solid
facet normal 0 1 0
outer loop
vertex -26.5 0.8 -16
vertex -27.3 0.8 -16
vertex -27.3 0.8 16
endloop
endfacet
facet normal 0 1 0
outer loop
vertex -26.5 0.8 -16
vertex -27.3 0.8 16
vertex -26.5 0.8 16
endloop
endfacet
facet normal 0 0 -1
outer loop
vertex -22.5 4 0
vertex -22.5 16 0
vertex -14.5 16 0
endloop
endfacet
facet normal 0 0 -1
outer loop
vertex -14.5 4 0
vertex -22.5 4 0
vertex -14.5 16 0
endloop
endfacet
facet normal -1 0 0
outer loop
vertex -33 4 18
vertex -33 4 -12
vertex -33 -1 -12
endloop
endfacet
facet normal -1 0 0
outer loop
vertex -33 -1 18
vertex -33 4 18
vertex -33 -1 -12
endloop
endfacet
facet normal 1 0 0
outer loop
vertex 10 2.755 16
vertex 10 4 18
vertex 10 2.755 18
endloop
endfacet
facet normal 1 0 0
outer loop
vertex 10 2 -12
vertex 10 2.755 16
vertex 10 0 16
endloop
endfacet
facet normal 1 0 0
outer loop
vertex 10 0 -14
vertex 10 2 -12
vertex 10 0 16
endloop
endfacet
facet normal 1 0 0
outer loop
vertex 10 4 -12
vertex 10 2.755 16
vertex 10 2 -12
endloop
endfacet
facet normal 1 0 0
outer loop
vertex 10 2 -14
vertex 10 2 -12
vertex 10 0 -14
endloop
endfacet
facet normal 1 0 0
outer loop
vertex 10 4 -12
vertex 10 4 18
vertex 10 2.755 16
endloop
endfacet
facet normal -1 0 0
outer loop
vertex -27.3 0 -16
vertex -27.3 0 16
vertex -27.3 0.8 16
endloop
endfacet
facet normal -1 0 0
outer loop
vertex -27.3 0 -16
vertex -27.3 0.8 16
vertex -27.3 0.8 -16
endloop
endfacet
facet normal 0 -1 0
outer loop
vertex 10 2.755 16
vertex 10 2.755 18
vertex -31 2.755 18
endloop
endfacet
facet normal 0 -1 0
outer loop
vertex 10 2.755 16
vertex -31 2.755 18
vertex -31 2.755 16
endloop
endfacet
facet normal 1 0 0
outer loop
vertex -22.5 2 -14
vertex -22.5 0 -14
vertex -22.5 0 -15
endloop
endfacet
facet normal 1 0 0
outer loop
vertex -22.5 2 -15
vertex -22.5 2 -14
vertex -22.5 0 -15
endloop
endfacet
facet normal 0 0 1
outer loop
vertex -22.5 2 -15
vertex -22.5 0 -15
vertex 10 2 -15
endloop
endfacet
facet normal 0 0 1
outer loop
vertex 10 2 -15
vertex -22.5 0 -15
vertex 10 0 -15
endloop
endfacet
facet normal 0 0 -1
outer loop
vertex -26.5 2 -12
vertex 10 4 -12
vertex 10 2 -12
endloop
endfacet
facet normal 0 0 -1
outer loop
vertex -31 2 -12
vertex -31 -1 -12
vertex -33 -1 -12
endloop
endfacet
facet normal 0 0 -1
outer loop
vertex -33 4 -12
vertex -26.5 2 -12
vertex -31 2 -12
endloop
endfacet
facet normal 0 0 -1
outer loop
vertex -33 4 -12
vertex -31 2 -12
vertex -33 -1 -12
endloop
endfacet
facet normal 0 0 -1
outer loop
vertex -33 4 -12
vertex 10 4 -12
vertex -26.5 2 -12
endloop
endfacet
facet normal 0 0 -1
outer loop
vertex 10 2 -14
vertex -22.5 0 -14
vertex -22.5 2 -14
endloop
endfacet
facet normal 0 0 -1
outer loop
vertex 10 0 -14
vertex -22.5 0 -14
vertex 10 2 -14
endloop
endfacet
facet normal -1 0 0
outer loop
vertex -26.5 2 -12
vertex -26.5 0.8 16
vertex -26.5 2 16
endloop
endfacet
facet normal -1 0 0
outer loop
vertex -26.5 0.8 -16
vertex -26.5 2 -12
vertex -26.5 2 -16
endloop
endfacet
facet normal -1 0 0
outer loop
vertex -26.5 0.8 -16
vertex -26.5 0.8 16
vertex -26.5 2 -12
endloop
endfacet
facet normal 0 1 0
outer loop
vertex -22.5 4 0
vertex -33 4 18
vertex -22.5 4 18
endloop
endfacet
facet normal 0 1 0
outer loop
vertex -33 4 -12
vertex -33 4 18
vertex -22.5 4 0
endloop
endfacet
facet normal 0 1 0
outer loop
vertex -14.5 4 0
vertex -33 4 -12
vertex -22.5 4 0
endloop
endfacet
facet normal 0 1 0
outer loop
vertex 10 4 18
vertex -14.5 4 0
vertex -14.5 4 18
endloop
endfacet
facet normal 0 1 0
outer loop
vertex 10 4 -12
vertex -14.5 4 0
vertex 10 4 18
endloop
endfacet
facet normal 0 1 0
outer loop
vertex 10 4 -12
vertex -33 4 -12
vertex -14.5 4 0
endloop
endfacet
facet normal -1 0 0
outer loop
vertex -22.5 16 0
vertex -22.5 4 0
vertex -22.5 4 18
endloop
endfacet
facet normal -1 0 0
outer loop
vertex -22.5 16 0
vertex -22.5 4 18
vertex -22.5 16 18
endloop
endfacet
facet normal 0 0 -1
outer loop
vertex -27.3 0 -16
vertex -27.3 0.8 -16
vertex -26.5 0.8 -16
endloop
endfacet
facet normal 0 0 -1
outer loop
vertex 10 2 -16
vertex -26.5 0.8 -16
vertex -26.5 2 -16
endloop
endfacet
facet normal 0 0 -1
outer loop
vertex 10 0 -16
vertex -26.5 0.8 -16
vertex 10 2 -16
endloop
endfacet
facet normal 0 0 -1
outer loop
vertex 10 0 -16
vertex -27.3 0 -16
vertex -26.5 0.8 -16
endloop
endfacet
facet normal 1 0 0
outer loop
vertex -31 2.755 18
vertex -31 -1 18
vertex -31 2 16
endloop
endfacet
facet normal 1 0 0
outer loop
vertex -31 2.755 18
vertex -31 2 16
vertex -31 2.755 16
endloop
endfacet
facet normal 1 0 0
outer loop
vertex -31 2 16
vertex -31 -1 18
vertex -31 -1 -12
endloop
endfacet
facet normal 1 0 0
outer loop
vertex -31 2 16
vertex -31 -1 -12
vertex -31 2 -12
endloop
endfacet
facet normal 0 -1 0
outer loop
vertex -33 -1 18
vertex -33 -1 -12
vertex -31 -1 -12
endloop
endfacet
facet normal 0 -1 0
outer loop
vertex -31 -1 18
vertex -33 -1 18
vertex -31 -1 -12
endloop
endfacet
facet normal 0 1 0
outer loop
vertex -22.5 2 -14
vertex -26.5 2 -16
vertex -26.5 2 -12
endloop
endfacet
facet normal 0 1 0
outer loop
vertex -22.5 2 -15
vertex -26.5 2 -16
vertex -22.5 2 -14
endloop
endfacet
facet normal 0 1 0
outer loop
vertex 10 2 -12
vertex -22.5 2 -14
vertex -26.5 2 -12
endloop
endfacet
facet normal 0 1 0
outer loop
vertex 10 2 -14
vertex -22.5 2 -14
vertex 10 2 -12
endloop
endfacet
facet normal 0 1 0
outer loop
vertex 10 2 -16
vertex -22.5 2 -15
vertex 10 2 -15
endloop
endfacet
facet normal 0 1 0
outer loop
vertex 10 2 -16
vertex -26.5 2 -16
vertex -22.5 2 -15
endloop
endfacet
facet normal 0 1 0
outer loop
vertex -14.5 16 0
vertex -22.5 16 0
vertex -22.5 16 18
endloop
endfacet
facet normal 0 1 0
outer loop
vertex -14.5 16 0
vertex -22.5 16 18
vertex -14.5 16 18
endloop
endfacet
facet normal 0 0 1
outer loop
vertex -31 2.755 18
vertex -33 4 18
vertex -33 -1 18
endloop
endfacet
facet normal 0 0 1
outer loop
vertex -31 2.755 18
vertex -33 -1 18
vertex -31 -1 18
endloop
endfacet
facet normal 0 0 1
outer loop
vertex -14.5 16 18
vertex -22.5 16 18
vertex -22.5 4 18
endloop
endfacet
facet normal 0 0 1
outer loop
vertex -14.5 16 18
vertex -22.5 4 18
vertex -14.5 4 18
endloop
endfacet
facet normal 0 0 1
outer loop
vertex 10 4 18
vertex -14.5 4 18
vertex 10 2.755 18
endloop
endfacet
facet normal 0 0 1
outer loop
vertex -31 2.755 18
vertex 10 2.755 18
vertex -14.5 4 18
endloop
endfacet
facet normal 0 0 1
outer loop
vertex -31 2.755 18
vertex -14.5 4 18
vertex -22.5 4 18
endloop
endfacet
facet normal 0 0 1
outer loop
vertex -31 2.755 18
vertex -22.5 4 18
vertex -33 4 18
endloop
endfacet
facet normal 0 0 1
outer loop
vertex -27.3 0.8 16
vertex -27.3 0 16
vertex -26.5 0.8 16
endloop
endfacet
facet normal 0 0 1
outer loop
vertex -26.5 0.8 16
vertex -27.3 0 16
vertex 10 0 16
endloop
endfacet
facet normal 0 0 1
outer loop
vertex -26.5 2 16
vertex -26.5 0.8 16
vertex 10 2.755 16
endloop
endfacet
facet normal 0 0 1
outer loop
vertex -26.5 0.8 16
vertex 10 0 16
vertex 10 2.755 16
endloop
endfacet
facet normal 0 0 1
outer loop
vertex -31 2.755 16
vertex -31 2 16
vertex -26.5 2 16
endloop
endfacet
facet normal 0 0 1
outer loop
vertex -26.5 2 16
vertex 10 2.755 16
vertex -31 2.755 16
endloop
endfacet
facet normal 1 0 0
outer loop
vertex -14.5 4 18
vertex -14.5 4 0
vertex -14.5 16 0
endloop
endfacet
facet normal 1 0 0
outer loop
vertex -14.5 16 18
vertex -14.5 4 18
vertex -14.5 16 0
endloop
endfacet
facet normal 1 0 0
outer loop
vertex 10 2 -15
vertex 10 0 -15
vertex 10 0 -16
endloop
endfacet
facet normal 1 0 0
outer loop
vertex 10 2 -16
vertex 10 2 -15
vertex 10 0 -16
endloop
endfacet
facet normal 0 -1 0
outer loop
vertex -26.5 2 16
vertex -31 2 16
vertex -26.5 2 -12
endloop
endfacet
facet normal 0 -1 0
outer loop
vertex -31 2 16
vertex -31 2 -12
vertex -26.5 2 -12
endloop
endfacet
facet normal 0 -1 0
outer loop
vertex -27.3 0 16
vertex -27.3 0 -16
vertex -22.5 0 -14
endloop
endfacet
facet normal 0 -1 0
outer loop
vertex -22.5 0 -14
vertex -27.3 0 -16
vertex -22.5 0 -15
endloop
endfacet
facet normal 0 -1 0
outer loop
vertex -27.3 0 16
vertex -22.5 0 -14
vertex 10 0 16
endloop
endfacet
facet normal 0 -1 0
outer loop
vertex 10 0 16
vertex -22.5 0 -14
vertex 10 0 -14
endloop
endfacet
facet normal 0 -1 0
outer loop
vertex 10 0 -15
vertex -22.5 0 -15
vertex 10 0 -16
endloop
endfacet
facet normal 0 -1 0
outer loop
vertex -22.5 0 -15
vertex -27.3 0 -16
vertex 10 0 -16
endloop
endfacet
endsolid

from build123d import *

# Parameters (mm, degrees)
SKETCH_1_W                      = 53
SKETCH_1_H                      = 32
EXTRUDE_1_DEPTH                 = 2
SKETCH_1_5_W                    = 0.8
SKETCH_1_5_H                    = 32
EXTRUDE_3_DEPTH                 = 0.8
SKETCH_1_6_W                    = 0.8
SKETCH_1_6_H                    = 32
EXTRUDE_4_DEPTH                 = 0.8
SKETCH_3_W                      = 54.6
SKETCH_3_H                      = 1
EXTRUDE_5_DEPTH                 = 0.8
SKETCH_4_W                      = 45
SKETCH_4_H                      = 1
CUT_EXTRUDE_1_DEPTH             = 33.222507662
SKETCH_4_2_W                    = 45
SKETCH_4_2_H                    = 1
EXTRUDE_6_DEPTH                 = 2
SKETCH_5_W                      = 45
SKETCH_5_H                      = 1
CUT_EXTRUDE_2_DEPTH             = 2
SKETCH_6_W                      = 0.8
SKETCH_6_H                      = 1
CUT_EXTRUDE_3_DEPTH             = 10
EXTRUDE_7_DEPTH                 = 18
EXTRUDE_7_DEPTH_BACK            = 12
EXTRUDE_8_DEPTH                 = 18
EXTRUDE_8_DEPTH_BACK            = 12
SKETCH_8_W                      = 49
SKETCH_8_H                      = 2
CUT_EXTRUDE_4_REACH             = 39.802
SKETCH_12_W                     = 2
SKETCH_12_H                     = 0.755050506
CUT_EXTRUDE_4_DIRECTION_2_REACH = 39.802
CUT_EXTRUDE_5_REACH             = 48.787
SKETCH_9_W                      = 48.171487548
SKETCH_9_H                      = 25.213726265
CUT_EXTRUDE_6_REACH             = 48.787
SKETCH_13_W                     = 1
SKETCH_13_H                     = 0.8
SKETCH_14_W                     = 8
SKETCH_14_H                     = 12
EXTRUDE_9_DEPTH                 = 18


with BuildPart() as part:
    # 草图1 → 凸台-拉伸1 (new body)
    with BuildSketch(Plane(origin=(0, 0, 0), x_dir=(1, 0, 0), z_dir=(0, 1, 0))):
        Rectangle(SKETCH_1_W, SKETCH_1_H)
    extrude(amount=EXTRUDE_1_DEPTH)

    # 草图1<5> → 凸台-拉伸3 (add)
    with BuildSketch(Plane(origin=(0, 0, 0), x_dir=(1, 0, 0), z_dir=(0, 1, 0))):
        with Locations((-26.9, 0)):
            Rectangle(SKETCH_1_5_W, SKETCH_1_5_H)
    extrude(amount=EXTRUDE_3_DEPTH)

    # 草图1<6> → 凸台-拉伸4 (add)
    with BuildSketch(Plane(origin=(0, 0, 0), x_dir=(1, 0, 0), z_dir=(0, 1, 0))):
        with Locations((26.9, 0)):
            Rectangle(SKETCH_1_6_W, SKETCH_1_6_H)
    extrude(amount=EXTRUDE_4_DEPTH)

    # 草图3 → 凸台-拉伸5 (add)
    with BuildSketch(Plane(origin=(0, 0, 0), x_dir=(1, 0, 0), z_dir=(0, 1, 0))):
        with Locations((0, -16.5)):
            Rectangle(SKETCH_3_W, SKETCH_3_H)
    extrude(amount=EXTRUDE_5_DEPTH)

    # 草图4 → 切除-拉伸1 (cut, through all)
    with BuildSketch(Plane(origin=(0, 0, 0), x_dir=(1, 0, 0), z_dir=(0, 1, 0))):
        with Locations((0, -14.5)):
            Rectangle(SKETCH_4_W, SKETCH_4_H)
    extrude(amount=CUT_EXTRUDE_1_DEPTH, mode=Mode.SUBTRACT)

    # 草图4<2> → 凸台-拉伸6 (add)
    with BuildSketch(Plane(origin=(0, 0, 0), x_dir=(1, 0, 0), z_dir=(0, 1, 0))):
        with Locations((0, -14.5)):
            Rectangle(SKETCH_4_2_W, SKETCH_4_2_H)
    extrude(amount=EXTRUDE_6_DEPTH)

    # 草图5 → 切除-拉伸2 (cut)
    with BuildSketch(Plane(origin=(0, 0, 0), x_dir=(1, 0, 0), z_dir=(0, 1, 0))):
        with Locations((0, 14.5)):
            Rectangle(SKETCH_5_W, SKETCH_5_H)
    extrude(amount=CUT_EXTRUDE_2_DEPTH, mode=Mode.SUBTRACT)

    # 草图6 → 切除-拉伸3 (cut)
    with BuildSketch(Plane(origin=(0, 0, 0), x_dir=(1, 0, 0), z_dir=(0, 1, 0))):
        with Locations((-26.9, -16.5)):
            Rectangle(SKETCH_6_W, SKETCH_6_H)
        with Locations((26.9, -16.5)):
            Rectangle(SKETCH_6_W, SKETCH_6_H)
    extrude(amount=CUT_EXTRUDE_3_DEPTH, mode=Mode.SUBTRACT)

    # 草图7 → 凸台-拉伸7 (add, two sides: drawn at the far end of the back side and taken through both)
    with BuildSketch(Plane.XY.offset(-EXTRUDE_7_DEPTH_BACK)):
        Polygon((-24.5, 2), (-24.5, 4), (-33, 4), (-33, -1), (-31, -1), (-31, 2), align=None)
        Polygon((24.5, 2), (24.5, 4), (33, 4), (33, -1), (31, -1), (31, 2), align=None)
    extrude(amount=EXTRUDE_7_DEPTH + EXTRUDE_7_DEPTH_BACK)

    # 草图8 → 凸台-拉伸8 (add, two sides: drawn at the far end of the back side and taken through both)
    with BuildSketch(Plane.XY.offset(-EXTRUDE_8_DEPTH_BACK)):
        with Locations((0, 3)):
            Rectangle(SKETCH_8_W, SKETCH_8_H)
    extrude(amount=EXTRUDE_8_DEPTH + EXTRUDE_8_DEPTH_BACK)

    # 切除-拉伸4: up to this face of the body (flat: up to its plane)
    cut_extrude_4_end = Plane(part.part.faces().sort_by_distance((-31, 0.5, 3))[0])
    # 草图12 → 切除-拉伸4 (cut, up to the picked face)
    with BuildSketch(Plane(origin=(0, 0, 0), x_dir=(0, 0, -1), z_dir=(1, 0, 0)), mode=Mode.PRIVATE) as cut_extrude_4_sk1:
        with Locations((-17, 2.377525253)):
            Rectangle(SKETCH_12_W, SKETCH_12_H)
    cut_extrude_4_tool1 = split(extrude(cut_extrude_4_sk1.sketch, amount=-CUT_EXTRUDE_4_REACH, mode=Mode.PRIVATE), bisect_by=cut_extrude_4_end, keep=Keep.BOTH, mode=Mode.PRIVATE)
    add(cut_extrude_4_tool1.solids().sort_by(Axis((0, 2.377525, 17), (-1, 0, 0)))[0], mode=Mode.SUBTRACT)

    # 切除-拉伸4 direction 2: up to this face of the body (flat: up to its plane)
    cut_extrude_4_direction_2_end = Plane(part.part.faces().sort_by_distance((31, 0.5, 3))[0])
    # 草图12 → 切除-拉伸4 direction 2 (cut, up to the picked face)
    with BuildSketch(Plane(origin=(0, 0, 0), x_dir=(0, 0, -1), z_dir=(1, 0, 0)), mode=Mode.PRIVATE) as cut_extrude_4_direction_2_sk1:
        with Locations((-17, 2.377525253)):
            Rectangle(SKETCH_12_W, SKETCH_12_H)
    cut_extrude_4_direction_2_tool1 = split(extrude(cut_extrude_4_direction_2_sk1.sketch, amount=CUT_EXTRUDE_4_DIRECTION_2_REACH, mode=Mode.PRIVATE), bisect_by=cut_extrude_4_direction_2_end, keep=Keep.BOTH, mode=Mode.PRIVATE)
    add(cut_extrude_4_direction_2_tool1.solids().sort_by(Axis((0, 2.377525, 17), (1, 0, 0)))[0], mode=Mode.SUBTRACT)

    # 草图9 → 切除-拉伸5 (cut, up to next)
    with BuildSketch(Plane(origin=(10, 0, 0), x_dir=(0, 0, -1), z_dir=(1, 0, 0)), mode=Mode.PRIVATE) as cut_extrude_5_sk1:
        with Locations((-3.488196671, 1.118476511)):
            Rectangle(SKETCH_9_W, SKETCH_9_H)
    cut_extrude_5_tool1 = extrude(cut_extrude_5_sk1.sketch, amount=CUT_EXTRUDE_5_REACH, mode=Mode.PRIVATE) & part.part
    add(cut_extrude_5_tool1.solids().sort_by_distance((10, 1.118477, 3.488197))[0], mode=Mode.SUBTRACT)

    # 草图13 → 切除-拉伸6 (cut, up to next)
    with BuildSketch(Plane(origin=(10, 0, 0), x_dir=(0, 0, -1), z_dir=(1, 0, 0)), mode=Mode.PRIVATE) as cut_extrude_6_sk1:
        with Locations((-16.5, 0.4)):
            Rectangle(SKETCH_13_W, SKETCH_13_H)
    cut_extrude_6_tool1 = extrude(cut_extrude_6_sk1.sketch, amount=-CUT_EXTRUDE_6_REACH, mode=Mode.PRIVATE) & part.part
    add(cut_extrude_6_tool1.solids().sort_by_distance((10, 0.4, 16.5))[0], mode=Mode.SUBTRACT)

    # 草图14 → 凸台-拉伸9 (add, through all)
    with BuildSketch(Plane.XY):
        with Locations((-18.5, 10)):
            Rectangle(SKETCH_14_W, SKETCH_14_H)
    extrude(amount=EXTRUDE_9_DEPTH)


solid = part.part
